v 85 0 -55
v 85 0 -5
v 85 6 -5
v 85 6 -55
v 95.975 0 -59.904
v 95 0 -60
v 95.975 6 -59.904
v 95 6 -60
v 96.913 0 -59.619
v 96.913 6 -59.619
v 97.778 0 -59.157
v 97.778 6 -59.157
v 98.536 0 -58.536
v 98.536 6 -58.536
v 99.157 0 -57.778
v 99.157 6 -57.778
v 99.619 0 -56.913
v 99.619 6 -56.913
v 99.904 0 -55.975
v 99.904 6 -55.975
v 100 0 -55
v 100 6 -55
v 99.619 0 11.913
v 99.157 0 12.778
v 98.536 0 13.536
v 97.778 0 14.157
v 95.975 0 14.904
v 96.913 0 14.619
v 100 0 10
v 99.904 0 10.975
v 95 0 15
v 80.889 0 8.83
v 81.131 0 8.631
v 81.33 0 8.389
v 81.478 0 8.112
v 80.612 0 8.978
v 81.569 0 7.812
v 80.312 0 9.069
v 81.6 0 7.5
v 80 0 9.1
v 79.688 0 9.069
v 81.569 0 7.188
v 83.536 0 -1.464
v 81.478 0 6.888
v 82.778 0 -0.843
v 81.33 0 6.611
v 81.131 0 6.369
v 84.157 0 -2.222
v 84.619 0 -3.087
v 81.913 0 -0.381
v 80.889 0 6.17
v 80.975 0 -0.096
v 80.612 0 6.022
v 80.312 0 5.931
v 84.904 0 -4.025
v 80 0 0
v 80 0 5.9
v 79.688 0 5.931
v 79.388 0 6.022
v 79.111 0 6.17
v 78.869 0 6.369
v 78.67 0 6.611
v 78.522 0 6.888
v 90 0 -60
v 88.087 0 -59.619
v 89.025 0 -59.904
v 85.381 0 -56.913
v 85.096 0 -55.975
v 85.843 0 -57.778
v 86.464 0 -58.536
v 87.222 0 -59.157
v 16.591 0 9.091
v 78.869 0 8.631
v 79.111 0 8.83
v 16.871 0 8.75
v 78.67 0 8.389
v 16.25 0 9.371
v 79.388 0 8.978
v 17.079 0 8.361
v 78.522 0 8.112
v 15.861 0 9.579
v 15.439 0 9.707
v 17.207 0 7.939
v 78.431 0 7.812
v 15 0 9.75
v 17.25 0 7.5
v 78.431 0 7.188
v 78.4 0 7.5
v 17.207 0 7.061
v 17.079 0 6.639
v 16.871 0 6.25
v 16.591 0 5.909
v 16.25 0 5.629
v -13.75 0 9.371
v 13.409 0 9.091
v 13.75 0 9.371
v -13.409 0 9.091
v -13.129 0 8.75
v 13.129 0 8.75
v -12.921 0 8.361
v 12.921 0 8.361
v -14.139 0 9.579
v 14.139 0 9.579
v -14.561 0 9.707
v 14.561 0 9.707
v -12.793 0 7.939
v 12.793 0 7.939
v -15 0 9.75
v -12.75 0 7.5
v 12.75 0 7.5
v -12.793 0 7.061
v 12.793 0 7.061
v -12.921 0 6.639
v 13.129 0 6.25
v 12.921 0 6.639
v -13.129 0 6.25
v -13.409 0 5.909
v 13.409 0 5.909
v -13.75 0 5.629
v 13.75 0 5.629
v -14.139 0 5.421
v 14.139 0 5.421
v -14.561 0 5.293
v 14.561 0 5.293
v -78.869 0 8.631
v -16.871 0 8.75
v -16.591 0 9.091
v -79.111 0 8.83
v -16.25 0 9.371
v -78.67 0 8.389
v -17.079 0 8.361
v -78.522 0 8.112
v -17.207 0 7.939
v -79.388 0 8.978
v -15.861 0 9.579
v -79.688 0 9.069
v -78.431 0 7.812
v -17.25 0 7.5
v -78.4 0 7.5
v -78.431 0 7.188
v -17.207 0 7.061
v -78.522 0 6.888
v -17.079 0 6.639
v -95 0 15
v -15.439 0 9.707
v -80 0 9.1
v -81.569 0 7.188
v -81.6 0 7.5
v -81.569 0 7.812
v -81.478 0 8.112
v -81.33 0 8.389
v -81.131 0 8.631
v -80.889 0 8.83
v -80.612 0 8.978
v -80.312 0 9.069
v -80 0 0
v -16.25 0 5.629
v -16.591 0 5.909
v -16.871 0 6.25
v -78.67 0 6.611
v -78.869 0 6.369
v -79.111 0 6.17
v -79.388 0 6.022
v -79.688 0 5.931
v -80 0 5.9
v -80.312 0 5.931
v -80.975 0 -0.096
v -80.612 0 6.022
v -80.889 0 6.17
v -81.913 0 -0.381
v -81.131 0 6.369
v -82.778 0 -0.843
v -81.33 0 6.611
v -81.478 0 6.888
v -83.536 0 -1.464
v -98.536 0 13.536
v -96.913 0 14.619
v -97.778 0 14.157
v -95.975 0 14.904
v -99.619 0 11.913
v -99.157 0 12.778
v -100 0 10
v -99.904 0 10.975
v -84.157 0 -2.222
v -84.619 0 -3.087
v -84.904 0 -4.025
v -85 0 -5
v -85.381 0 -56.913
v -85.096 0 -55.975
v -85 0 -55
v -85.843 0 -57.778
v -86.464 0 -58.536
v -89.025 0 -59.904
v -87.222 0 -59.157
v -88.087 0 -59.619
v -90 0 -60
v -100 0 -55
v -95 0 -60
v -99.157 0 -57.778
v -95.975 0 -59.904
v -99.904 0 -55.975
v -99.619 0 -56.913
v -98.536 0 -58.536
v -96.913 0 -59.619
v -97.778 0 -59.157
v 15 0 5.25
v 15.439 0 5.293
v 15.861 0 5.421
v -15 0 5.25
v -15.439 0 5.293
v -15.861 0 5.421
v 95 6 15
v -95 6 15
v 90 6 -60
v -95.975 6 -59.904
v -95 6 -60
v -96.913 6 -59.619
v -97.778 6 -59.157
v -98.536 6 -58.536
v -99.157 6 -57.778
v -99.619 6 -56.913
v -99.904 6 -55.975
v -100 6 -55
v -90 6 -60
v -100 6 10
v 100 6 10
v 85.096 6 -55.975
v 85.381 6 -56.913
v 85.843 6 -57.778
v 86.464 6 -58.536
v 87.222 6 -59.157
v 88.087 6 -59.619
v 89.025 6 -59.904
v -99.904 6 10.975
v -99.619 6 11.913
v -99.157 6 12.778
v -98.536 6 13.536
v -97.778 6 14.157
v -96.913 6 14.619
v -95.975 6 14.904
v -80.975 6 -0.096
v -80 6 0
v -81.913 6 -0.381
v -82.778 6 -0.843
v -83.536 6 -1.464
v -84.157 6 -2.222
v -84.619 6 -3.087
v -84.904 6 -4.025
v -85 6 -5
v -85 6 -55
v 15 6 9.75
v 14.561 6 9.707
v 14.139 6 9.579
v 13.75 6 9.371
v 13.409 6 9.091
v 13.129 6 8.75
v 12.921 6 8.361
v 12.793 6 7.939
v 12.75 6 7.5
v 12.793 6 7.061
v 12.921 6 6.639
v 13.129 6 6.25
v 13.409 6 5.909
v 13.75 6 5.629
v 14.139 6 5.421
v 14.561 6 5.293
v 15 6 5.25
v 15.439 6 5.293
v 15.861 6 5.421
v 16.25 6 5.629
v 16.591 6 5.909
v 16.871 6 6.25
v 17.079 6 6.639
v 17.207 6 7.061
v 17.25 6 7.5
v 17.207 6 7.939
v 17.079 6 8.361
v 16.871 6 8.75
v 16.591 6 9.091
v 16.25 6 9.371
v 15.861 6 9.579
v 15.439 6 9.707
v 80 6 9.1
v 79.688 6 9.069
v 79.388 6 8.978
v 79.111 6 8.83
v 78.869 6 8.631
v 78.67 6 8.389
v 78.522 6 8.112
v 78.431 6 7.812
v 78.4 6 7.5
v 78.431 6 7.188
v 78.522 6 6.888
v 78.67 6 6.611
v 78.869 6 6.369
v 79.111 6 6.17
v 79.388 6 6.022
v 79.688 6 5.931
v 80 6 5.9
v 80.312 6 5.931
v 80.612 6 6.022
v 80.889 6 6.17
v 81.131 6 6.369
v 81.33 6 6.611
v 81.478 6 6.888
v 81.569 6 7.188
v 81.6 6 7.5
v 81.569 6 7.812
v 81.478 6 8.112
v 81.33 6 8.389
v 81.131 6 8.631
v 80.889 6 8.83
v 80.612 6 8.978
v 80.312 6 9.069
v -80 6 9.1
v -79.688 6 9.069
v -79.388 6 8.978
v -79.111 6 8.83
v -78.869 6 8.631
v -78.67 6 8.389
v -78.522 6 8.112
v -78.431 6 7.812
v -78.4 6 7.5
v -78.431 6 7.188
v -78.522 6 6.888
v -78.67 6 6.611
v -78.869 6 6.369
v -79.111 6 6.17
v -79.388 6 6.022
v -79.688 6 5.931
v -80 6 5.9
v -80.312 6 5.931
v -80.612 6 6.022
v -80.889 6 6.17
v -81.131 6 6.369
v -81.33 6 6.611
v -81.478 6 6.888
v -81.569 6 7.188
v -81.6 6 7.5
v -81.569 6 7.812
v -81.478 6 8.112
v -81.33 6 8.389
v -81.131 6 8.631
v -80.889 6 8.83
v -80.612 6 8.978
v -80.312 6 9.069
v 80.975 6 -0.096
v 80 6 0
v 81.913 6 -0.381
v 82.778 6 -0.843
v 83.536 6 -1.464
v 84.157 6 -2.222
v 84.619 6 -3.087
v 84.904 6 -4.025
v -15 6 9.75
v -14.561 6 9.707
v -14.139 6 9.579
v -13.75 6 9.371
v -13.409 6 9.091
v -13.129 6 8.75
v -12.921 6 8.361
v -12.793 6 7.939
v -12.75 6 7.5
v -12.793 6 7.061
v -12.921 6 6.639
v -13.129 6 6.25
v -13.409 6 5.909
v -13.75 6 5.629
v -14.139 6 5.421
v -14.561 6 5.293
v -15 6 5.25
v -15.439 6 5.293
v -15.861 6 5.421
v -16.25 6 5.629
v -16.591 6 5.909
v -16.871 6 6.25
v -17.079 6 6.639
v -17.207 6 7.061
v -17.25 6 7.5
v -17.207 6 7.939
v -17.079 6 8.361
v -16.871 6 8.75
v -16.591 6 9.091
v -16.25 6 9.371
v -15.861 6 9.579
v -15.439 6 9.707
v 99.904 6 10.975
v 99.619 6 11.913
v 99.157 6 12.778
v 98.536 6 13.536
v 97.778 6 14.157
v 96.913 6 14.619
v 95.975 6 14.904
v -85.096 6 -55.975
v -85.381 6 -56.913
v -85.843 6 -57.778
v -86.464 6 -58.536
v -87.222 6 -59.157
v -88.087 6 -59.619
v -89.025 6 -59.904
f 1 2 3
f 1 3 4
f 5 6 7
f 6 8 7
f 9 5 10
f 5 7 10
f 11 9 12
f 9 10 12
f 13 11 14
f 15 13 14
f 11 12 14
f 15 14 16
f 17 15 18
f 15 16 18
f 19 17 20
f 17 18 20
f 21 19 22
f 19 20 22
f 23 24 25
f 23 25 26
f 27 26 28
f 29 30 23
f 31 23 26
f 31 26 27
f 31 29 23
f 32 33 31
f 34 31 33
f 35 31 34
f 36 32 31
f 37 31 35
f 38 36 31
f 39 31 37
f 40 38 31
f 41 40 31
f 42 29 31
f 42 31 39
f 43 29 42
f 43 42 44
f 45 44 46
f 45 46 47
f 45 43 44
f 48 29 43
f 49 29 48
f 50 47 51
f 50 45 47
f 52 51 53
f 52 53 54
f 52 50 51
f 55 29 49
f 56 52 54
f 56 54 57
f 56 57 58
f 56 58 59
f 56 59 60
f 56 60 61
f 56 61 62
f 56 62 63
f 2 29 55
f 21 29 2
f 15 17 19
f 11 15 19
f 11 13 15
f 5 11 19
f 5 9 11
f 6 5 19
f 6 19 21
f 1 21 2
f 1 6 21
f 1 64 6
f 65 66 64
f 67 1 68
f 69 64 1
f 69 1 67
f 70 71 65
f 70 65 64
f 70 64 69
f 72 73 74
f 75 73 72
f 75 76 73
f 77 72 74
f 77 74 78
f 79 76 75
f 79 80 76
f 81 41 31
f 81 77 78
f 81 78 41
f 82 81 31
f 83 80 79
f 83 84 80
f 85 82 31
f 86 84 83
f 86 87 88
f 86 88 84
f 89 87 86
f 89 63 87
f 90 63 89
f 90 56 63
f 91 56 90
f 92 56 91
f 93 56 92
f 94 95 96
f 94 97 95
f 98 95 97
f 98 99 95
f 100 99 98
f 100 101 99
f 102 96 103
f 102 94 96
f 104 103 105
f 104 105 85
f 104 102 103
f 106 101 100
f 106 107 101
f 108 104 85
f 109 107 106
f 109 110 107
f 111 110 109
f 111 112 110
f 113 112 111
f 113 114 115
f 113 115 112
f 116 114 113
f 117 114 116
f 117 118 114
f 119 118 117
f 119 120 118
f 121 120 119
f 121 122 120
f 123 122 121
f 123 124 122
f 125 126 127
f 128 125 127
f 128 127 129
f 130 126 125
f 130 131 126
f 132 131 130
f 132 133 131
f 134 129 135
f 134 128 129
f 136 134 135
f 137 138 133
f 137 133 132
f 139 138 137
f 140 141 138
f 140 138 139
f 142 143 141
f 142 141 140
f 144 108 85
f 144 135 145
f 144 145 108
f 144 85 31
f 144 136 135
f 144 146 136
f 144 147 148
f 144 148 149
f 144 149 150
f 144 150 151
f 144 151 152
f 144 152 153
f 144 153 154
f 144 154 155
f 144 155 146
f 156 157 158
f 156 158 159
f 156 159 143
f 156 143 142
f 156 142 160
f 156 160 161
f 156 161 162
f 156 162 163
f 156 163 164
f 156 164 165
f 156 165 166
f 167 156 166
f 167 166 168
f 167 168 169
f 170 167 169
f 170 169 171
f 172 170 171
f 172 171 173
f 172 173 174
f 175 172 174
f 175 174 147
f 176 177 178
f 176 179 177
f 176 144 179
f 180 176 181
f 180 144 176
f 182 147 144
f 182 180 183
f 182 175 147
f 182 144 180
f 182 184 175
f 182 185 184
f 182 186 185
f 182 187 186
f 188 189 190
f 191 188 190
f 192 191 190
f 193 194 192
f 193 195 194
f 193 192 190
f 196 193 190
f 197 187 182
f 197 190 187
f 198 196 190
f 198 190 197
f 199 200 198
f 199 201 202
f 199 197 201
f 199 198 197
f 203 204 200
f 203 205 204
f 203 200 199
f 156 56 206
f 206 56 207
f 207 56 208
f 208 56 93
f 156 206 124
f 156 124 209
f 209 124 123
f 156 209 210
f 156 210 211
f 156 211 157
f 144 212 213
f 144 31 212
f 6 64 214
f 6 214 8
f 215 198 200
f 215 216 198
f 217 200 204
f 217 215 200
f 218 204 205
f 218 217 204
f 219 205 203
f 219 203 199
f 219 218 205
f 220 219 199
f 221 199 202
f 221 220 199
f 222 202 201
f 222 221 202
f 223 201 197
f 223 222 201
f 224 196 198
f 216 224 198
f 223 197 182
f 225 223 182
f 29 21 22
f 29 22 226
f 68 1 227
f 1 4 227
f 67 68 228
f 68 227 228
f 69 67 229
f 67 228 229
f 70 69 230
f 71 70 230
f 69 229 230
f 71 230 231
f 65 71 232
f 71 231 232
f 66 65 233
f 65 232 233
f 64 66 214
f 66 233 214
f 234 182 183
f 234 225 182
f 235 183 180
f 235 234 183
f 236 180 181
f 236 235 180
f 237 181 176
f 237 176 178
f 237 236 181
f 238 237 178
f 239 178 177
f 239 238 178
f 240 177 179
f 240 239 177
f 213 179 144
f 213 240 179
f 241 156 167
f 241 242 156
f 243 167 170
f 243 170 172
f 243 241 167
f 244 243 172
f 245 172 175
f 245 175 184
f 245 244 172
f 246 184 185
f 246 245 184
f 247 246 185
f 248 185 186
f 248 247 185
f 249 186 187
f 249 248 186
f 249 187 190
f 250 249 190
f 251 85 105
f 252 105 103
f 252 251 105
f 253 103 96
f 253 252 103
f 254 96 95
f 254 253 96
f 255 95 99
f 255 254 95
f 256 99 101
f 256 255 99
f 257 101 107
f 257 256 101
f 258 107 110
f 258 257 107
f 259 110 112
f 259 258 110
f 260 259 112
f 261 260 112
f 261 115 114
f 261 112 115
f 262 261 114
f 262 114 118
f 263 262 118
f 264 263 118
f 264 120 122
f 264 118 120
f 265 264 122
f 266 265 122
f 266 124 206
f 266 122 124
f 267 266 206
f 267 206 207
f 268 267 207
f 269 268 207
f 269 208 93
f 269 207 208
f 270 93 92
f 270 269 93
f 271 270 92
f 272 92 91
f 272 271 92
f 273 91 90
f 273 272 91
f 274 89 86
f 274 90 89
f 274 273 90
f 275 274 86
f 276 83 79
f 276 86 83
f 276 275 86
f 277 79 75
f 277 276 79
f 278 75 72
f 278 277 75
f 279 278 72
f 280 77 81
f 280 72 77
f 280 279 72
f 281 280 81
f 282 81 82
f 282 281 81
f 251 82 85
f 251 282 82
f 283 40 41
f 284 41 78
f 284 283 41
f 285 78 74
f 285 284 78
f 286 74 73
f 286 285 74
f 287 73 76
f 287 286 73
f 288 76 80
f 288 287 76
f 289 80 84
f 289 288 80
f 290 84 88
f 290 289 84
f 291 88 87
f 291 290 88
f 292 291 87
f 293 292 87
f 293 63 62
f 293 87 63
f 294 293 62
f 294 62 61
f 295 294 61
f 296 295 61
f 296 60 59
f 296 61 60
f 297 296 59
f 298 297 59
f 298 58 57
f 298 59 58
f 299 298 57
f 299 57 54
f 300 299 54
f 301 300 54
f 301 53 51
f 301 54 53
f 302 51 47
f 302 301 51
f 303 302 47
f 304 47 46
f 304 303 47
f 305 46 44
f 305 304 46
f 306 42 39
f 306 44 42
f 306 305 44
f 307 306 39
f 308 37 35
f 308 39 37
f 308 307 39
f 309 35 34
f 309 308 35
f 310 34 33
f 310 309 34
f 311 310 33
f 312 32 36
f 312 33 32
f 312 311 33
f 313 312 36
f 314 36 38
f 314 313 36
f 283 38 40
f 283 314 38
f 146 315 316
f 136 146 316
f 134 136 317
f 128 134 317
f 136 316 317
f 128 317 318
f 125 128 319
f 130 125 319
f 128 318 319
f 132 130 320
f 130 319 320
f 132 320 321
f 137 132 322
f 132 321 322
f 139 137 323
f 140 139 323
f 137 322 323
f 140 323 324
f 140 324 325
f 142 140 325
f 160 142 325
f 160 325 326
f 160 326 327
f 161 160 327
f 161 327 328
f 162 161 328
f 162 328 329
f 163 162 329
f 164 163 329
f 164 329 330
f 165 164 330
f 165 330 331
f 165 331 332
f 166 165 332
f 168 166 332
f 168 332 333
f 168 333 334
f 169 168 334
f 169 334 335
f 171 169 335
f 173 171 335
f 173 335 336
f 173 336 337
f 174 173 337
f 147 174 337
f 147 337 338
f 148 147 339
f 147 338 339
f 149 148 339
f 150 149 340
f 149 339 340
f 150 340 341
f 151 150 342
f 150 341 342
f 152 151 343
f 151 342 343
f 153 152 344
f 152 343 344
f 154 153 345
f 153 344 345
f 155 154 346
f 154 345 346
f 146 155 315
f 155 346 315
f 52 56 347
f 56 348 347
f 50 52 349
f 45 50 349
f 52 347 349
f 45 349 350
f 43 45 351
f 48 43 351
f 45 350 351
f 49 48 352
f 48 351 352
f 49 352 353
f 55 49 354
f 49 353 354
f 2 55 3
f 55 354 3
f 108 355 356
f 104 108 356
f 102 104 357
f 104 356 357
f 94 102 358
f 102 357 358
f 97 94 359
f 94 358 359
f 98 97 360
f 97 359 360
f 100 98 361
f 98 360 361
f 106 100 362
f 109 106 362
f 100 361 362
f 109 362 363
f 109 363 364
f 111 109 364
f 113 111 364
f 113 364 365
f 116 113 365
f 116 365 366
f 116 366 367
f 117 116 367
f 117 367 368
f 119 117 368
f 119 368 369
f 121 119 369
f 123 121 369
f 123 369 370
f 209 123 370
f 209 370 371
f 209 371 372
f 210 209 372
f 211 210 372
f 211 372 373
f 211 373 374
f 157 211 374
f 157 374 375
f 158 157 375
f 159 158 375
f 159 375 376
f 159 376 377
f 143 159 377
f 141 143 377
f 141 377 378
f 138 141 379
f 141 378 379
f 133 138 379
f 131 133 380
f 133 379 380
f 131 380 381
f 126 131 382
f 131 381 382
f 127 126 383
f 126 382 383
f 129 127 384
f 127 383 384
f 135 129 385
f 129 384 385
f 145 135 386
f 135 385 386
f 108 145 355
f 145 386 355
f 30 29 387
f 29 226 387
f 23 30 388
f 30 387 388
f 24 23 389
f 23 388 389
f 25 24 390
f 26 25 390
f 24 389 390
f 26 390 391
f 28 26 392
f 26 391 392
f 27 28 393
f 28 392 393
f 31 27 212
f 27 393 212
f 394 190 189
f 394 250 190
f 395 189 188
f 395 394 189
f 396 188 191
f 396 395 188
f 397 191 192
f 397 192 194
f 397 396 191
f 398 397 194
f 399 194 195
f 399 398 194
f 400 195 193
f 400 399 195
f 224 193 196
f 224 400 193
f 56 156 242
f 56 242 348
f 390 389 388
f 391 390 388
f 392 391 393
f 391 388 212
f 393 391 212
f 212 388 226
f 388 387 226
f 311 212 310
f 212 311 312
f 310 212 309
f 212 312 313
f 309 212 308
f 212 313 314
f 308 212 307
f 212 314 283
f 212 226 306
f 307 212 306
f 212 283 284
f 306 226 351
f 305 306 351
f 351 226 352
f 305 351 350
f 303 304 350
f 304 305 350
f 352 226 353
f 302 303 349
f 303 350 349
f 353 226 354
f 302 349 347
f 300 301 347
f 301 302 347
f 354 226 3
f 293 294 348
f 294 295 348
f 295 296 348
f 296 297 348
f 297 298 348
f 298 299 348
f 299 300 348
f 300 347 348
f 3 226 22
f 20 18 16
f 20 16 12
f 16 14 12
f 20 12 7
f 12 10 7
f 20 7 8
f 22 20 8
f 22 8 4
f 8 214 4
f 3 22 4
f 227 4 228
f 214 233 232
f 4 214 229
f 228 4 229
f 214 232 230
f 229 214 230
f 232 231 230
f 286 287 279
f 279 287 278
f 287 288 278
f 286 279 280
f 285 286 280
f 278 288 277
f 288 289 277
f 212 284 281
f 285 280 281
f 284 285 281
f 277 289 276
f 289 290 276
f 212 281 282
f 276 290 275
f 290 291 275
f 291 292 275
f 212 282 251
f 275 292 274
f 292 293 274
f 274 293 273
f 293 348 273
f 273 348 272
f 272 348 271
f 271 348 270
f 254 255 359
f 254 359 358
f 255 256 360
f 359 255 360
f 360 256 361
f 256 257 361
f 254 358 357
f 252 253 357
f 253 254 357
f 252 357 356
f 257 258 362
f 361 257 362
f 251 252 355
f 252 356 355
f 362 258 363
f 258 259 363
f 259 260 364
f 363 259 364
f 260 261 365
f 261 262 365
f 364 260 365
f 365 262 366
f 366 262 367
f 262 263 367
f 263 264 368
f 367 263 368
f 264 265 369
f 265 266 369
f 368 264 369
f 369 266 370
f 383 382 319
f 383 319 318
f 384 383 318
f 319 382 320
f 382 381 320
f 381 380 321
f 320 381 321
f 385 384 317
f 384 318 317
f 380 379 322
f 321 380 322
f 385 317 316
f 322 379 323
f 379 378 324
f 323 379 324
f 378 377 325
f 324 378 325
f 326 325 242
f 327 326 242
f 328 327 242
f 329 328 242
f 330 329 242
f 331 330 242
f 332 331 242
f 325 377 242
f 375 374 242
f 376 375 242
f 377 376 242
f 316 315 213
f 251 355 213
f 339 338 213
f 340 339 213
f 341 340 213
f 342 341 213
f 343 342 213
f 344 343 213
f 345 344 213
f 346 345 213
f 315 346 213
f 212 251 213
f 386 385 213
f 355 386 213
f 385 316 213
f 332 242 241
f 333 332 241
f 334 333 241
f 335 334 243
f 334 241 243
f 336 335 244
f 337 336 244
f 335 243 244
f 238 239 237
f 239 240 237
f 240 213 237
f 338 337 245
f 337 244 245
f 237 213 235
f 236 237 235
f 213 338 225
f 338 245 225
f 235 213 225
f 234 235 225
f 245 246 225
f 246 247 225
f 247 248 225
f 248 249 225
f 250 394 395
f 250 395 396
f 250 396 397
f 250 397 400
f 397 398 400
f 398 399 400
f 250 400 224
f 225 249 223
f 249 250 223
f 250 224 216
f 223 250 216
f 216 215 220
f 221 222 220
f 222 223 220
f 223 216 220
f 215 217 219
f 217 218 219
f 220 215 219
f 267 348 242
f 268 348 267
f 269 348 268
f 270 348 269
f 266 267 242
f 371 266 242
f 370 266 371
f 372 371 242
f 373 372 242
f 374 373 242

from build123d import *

# Parameters (mm, degrees)
BOSS_EXTRUDE1_DEPTH  = 6
FILLET1_R            = 5
SKETCH2_R            = 2.25
SKETCH2_R_2          = 1.6
CUT_EXTRUDE1_DEPTH   = 117.773284616
FILLET1_OF_MIRROR1_R = 5


with BuildPart() as part:
    # Sketch1 → Boss-Extrude1 (new body)
    with BuildSketch(Plane(origin=(0, 0, 0), x_dir=(1, 0, 0), z_dir=(0, 1, 0))):
        Polygon((0, 0), (-85, 0), (-85, 60), (-100, 60), (-100, -15), (0, -15), align=None)
    boss_extrude1 = extrude(amount=BOSS_EXTRUDE1_DEPTH)

    # Fillet1
    fillet1_edges = [part.edges().sort_by_distance(p)[0] for p in [
        (-100, 3, 15),
        (-100, 3, -60),
        (-85, 3, -60),
        (-85, 3, 0),
    ]]
    fillet(fillet1_edges, radius=FILLET1_R)

    # Sketch2 → Cut-Extrude1 (cut, through all)
    with BuildSketch(Plane(origin=(0, 6, 0), x_dir=(1, 0, 0), z_dir=(0, 1, 0))):
        with Locations(Location((-15, -7.5, 0), (0, 0, 270))):
            Circle(SKETCH2_R)
        with Locations(Location((-80, -7.5, 0), (0, 0, 270))):
            Circle(SKETCH2_R_2)
    cut_extrude1 = extrude(amount=-CUT_EXTRUDE1_DEPTH, mode=Mode.SUBTRACT)

    # Mirror1: Boss-Extrude1, Cut-Extrude1 across plane
    add(boss_extrude1.mirror(Plane(origin=(0, 0, 0), x_dir=(0, 0, 1), z_dir=(1, 0, 0))))
    add(cut_extrude1.mirror(Plane(origin=(0, 0, 0), x_dir=(0, 0, 1), z_dir=(1, 0, 0))), mode=Mode.SUBTRACT)

    # Fillet1 of Mirror1
    fillet1_of_mirror1_edges = [part.edges().sort_by_distance(p)[0] for p in [
        (100, 3, 15),
        (100, 3, -60),
        (85, 3, -60),
        (85, 3, 0),
    ]]
    fillet(fillet1_of_mirror1_edges, radius=FILLET1_OF_MIRROR1_R)


solid = part.part
